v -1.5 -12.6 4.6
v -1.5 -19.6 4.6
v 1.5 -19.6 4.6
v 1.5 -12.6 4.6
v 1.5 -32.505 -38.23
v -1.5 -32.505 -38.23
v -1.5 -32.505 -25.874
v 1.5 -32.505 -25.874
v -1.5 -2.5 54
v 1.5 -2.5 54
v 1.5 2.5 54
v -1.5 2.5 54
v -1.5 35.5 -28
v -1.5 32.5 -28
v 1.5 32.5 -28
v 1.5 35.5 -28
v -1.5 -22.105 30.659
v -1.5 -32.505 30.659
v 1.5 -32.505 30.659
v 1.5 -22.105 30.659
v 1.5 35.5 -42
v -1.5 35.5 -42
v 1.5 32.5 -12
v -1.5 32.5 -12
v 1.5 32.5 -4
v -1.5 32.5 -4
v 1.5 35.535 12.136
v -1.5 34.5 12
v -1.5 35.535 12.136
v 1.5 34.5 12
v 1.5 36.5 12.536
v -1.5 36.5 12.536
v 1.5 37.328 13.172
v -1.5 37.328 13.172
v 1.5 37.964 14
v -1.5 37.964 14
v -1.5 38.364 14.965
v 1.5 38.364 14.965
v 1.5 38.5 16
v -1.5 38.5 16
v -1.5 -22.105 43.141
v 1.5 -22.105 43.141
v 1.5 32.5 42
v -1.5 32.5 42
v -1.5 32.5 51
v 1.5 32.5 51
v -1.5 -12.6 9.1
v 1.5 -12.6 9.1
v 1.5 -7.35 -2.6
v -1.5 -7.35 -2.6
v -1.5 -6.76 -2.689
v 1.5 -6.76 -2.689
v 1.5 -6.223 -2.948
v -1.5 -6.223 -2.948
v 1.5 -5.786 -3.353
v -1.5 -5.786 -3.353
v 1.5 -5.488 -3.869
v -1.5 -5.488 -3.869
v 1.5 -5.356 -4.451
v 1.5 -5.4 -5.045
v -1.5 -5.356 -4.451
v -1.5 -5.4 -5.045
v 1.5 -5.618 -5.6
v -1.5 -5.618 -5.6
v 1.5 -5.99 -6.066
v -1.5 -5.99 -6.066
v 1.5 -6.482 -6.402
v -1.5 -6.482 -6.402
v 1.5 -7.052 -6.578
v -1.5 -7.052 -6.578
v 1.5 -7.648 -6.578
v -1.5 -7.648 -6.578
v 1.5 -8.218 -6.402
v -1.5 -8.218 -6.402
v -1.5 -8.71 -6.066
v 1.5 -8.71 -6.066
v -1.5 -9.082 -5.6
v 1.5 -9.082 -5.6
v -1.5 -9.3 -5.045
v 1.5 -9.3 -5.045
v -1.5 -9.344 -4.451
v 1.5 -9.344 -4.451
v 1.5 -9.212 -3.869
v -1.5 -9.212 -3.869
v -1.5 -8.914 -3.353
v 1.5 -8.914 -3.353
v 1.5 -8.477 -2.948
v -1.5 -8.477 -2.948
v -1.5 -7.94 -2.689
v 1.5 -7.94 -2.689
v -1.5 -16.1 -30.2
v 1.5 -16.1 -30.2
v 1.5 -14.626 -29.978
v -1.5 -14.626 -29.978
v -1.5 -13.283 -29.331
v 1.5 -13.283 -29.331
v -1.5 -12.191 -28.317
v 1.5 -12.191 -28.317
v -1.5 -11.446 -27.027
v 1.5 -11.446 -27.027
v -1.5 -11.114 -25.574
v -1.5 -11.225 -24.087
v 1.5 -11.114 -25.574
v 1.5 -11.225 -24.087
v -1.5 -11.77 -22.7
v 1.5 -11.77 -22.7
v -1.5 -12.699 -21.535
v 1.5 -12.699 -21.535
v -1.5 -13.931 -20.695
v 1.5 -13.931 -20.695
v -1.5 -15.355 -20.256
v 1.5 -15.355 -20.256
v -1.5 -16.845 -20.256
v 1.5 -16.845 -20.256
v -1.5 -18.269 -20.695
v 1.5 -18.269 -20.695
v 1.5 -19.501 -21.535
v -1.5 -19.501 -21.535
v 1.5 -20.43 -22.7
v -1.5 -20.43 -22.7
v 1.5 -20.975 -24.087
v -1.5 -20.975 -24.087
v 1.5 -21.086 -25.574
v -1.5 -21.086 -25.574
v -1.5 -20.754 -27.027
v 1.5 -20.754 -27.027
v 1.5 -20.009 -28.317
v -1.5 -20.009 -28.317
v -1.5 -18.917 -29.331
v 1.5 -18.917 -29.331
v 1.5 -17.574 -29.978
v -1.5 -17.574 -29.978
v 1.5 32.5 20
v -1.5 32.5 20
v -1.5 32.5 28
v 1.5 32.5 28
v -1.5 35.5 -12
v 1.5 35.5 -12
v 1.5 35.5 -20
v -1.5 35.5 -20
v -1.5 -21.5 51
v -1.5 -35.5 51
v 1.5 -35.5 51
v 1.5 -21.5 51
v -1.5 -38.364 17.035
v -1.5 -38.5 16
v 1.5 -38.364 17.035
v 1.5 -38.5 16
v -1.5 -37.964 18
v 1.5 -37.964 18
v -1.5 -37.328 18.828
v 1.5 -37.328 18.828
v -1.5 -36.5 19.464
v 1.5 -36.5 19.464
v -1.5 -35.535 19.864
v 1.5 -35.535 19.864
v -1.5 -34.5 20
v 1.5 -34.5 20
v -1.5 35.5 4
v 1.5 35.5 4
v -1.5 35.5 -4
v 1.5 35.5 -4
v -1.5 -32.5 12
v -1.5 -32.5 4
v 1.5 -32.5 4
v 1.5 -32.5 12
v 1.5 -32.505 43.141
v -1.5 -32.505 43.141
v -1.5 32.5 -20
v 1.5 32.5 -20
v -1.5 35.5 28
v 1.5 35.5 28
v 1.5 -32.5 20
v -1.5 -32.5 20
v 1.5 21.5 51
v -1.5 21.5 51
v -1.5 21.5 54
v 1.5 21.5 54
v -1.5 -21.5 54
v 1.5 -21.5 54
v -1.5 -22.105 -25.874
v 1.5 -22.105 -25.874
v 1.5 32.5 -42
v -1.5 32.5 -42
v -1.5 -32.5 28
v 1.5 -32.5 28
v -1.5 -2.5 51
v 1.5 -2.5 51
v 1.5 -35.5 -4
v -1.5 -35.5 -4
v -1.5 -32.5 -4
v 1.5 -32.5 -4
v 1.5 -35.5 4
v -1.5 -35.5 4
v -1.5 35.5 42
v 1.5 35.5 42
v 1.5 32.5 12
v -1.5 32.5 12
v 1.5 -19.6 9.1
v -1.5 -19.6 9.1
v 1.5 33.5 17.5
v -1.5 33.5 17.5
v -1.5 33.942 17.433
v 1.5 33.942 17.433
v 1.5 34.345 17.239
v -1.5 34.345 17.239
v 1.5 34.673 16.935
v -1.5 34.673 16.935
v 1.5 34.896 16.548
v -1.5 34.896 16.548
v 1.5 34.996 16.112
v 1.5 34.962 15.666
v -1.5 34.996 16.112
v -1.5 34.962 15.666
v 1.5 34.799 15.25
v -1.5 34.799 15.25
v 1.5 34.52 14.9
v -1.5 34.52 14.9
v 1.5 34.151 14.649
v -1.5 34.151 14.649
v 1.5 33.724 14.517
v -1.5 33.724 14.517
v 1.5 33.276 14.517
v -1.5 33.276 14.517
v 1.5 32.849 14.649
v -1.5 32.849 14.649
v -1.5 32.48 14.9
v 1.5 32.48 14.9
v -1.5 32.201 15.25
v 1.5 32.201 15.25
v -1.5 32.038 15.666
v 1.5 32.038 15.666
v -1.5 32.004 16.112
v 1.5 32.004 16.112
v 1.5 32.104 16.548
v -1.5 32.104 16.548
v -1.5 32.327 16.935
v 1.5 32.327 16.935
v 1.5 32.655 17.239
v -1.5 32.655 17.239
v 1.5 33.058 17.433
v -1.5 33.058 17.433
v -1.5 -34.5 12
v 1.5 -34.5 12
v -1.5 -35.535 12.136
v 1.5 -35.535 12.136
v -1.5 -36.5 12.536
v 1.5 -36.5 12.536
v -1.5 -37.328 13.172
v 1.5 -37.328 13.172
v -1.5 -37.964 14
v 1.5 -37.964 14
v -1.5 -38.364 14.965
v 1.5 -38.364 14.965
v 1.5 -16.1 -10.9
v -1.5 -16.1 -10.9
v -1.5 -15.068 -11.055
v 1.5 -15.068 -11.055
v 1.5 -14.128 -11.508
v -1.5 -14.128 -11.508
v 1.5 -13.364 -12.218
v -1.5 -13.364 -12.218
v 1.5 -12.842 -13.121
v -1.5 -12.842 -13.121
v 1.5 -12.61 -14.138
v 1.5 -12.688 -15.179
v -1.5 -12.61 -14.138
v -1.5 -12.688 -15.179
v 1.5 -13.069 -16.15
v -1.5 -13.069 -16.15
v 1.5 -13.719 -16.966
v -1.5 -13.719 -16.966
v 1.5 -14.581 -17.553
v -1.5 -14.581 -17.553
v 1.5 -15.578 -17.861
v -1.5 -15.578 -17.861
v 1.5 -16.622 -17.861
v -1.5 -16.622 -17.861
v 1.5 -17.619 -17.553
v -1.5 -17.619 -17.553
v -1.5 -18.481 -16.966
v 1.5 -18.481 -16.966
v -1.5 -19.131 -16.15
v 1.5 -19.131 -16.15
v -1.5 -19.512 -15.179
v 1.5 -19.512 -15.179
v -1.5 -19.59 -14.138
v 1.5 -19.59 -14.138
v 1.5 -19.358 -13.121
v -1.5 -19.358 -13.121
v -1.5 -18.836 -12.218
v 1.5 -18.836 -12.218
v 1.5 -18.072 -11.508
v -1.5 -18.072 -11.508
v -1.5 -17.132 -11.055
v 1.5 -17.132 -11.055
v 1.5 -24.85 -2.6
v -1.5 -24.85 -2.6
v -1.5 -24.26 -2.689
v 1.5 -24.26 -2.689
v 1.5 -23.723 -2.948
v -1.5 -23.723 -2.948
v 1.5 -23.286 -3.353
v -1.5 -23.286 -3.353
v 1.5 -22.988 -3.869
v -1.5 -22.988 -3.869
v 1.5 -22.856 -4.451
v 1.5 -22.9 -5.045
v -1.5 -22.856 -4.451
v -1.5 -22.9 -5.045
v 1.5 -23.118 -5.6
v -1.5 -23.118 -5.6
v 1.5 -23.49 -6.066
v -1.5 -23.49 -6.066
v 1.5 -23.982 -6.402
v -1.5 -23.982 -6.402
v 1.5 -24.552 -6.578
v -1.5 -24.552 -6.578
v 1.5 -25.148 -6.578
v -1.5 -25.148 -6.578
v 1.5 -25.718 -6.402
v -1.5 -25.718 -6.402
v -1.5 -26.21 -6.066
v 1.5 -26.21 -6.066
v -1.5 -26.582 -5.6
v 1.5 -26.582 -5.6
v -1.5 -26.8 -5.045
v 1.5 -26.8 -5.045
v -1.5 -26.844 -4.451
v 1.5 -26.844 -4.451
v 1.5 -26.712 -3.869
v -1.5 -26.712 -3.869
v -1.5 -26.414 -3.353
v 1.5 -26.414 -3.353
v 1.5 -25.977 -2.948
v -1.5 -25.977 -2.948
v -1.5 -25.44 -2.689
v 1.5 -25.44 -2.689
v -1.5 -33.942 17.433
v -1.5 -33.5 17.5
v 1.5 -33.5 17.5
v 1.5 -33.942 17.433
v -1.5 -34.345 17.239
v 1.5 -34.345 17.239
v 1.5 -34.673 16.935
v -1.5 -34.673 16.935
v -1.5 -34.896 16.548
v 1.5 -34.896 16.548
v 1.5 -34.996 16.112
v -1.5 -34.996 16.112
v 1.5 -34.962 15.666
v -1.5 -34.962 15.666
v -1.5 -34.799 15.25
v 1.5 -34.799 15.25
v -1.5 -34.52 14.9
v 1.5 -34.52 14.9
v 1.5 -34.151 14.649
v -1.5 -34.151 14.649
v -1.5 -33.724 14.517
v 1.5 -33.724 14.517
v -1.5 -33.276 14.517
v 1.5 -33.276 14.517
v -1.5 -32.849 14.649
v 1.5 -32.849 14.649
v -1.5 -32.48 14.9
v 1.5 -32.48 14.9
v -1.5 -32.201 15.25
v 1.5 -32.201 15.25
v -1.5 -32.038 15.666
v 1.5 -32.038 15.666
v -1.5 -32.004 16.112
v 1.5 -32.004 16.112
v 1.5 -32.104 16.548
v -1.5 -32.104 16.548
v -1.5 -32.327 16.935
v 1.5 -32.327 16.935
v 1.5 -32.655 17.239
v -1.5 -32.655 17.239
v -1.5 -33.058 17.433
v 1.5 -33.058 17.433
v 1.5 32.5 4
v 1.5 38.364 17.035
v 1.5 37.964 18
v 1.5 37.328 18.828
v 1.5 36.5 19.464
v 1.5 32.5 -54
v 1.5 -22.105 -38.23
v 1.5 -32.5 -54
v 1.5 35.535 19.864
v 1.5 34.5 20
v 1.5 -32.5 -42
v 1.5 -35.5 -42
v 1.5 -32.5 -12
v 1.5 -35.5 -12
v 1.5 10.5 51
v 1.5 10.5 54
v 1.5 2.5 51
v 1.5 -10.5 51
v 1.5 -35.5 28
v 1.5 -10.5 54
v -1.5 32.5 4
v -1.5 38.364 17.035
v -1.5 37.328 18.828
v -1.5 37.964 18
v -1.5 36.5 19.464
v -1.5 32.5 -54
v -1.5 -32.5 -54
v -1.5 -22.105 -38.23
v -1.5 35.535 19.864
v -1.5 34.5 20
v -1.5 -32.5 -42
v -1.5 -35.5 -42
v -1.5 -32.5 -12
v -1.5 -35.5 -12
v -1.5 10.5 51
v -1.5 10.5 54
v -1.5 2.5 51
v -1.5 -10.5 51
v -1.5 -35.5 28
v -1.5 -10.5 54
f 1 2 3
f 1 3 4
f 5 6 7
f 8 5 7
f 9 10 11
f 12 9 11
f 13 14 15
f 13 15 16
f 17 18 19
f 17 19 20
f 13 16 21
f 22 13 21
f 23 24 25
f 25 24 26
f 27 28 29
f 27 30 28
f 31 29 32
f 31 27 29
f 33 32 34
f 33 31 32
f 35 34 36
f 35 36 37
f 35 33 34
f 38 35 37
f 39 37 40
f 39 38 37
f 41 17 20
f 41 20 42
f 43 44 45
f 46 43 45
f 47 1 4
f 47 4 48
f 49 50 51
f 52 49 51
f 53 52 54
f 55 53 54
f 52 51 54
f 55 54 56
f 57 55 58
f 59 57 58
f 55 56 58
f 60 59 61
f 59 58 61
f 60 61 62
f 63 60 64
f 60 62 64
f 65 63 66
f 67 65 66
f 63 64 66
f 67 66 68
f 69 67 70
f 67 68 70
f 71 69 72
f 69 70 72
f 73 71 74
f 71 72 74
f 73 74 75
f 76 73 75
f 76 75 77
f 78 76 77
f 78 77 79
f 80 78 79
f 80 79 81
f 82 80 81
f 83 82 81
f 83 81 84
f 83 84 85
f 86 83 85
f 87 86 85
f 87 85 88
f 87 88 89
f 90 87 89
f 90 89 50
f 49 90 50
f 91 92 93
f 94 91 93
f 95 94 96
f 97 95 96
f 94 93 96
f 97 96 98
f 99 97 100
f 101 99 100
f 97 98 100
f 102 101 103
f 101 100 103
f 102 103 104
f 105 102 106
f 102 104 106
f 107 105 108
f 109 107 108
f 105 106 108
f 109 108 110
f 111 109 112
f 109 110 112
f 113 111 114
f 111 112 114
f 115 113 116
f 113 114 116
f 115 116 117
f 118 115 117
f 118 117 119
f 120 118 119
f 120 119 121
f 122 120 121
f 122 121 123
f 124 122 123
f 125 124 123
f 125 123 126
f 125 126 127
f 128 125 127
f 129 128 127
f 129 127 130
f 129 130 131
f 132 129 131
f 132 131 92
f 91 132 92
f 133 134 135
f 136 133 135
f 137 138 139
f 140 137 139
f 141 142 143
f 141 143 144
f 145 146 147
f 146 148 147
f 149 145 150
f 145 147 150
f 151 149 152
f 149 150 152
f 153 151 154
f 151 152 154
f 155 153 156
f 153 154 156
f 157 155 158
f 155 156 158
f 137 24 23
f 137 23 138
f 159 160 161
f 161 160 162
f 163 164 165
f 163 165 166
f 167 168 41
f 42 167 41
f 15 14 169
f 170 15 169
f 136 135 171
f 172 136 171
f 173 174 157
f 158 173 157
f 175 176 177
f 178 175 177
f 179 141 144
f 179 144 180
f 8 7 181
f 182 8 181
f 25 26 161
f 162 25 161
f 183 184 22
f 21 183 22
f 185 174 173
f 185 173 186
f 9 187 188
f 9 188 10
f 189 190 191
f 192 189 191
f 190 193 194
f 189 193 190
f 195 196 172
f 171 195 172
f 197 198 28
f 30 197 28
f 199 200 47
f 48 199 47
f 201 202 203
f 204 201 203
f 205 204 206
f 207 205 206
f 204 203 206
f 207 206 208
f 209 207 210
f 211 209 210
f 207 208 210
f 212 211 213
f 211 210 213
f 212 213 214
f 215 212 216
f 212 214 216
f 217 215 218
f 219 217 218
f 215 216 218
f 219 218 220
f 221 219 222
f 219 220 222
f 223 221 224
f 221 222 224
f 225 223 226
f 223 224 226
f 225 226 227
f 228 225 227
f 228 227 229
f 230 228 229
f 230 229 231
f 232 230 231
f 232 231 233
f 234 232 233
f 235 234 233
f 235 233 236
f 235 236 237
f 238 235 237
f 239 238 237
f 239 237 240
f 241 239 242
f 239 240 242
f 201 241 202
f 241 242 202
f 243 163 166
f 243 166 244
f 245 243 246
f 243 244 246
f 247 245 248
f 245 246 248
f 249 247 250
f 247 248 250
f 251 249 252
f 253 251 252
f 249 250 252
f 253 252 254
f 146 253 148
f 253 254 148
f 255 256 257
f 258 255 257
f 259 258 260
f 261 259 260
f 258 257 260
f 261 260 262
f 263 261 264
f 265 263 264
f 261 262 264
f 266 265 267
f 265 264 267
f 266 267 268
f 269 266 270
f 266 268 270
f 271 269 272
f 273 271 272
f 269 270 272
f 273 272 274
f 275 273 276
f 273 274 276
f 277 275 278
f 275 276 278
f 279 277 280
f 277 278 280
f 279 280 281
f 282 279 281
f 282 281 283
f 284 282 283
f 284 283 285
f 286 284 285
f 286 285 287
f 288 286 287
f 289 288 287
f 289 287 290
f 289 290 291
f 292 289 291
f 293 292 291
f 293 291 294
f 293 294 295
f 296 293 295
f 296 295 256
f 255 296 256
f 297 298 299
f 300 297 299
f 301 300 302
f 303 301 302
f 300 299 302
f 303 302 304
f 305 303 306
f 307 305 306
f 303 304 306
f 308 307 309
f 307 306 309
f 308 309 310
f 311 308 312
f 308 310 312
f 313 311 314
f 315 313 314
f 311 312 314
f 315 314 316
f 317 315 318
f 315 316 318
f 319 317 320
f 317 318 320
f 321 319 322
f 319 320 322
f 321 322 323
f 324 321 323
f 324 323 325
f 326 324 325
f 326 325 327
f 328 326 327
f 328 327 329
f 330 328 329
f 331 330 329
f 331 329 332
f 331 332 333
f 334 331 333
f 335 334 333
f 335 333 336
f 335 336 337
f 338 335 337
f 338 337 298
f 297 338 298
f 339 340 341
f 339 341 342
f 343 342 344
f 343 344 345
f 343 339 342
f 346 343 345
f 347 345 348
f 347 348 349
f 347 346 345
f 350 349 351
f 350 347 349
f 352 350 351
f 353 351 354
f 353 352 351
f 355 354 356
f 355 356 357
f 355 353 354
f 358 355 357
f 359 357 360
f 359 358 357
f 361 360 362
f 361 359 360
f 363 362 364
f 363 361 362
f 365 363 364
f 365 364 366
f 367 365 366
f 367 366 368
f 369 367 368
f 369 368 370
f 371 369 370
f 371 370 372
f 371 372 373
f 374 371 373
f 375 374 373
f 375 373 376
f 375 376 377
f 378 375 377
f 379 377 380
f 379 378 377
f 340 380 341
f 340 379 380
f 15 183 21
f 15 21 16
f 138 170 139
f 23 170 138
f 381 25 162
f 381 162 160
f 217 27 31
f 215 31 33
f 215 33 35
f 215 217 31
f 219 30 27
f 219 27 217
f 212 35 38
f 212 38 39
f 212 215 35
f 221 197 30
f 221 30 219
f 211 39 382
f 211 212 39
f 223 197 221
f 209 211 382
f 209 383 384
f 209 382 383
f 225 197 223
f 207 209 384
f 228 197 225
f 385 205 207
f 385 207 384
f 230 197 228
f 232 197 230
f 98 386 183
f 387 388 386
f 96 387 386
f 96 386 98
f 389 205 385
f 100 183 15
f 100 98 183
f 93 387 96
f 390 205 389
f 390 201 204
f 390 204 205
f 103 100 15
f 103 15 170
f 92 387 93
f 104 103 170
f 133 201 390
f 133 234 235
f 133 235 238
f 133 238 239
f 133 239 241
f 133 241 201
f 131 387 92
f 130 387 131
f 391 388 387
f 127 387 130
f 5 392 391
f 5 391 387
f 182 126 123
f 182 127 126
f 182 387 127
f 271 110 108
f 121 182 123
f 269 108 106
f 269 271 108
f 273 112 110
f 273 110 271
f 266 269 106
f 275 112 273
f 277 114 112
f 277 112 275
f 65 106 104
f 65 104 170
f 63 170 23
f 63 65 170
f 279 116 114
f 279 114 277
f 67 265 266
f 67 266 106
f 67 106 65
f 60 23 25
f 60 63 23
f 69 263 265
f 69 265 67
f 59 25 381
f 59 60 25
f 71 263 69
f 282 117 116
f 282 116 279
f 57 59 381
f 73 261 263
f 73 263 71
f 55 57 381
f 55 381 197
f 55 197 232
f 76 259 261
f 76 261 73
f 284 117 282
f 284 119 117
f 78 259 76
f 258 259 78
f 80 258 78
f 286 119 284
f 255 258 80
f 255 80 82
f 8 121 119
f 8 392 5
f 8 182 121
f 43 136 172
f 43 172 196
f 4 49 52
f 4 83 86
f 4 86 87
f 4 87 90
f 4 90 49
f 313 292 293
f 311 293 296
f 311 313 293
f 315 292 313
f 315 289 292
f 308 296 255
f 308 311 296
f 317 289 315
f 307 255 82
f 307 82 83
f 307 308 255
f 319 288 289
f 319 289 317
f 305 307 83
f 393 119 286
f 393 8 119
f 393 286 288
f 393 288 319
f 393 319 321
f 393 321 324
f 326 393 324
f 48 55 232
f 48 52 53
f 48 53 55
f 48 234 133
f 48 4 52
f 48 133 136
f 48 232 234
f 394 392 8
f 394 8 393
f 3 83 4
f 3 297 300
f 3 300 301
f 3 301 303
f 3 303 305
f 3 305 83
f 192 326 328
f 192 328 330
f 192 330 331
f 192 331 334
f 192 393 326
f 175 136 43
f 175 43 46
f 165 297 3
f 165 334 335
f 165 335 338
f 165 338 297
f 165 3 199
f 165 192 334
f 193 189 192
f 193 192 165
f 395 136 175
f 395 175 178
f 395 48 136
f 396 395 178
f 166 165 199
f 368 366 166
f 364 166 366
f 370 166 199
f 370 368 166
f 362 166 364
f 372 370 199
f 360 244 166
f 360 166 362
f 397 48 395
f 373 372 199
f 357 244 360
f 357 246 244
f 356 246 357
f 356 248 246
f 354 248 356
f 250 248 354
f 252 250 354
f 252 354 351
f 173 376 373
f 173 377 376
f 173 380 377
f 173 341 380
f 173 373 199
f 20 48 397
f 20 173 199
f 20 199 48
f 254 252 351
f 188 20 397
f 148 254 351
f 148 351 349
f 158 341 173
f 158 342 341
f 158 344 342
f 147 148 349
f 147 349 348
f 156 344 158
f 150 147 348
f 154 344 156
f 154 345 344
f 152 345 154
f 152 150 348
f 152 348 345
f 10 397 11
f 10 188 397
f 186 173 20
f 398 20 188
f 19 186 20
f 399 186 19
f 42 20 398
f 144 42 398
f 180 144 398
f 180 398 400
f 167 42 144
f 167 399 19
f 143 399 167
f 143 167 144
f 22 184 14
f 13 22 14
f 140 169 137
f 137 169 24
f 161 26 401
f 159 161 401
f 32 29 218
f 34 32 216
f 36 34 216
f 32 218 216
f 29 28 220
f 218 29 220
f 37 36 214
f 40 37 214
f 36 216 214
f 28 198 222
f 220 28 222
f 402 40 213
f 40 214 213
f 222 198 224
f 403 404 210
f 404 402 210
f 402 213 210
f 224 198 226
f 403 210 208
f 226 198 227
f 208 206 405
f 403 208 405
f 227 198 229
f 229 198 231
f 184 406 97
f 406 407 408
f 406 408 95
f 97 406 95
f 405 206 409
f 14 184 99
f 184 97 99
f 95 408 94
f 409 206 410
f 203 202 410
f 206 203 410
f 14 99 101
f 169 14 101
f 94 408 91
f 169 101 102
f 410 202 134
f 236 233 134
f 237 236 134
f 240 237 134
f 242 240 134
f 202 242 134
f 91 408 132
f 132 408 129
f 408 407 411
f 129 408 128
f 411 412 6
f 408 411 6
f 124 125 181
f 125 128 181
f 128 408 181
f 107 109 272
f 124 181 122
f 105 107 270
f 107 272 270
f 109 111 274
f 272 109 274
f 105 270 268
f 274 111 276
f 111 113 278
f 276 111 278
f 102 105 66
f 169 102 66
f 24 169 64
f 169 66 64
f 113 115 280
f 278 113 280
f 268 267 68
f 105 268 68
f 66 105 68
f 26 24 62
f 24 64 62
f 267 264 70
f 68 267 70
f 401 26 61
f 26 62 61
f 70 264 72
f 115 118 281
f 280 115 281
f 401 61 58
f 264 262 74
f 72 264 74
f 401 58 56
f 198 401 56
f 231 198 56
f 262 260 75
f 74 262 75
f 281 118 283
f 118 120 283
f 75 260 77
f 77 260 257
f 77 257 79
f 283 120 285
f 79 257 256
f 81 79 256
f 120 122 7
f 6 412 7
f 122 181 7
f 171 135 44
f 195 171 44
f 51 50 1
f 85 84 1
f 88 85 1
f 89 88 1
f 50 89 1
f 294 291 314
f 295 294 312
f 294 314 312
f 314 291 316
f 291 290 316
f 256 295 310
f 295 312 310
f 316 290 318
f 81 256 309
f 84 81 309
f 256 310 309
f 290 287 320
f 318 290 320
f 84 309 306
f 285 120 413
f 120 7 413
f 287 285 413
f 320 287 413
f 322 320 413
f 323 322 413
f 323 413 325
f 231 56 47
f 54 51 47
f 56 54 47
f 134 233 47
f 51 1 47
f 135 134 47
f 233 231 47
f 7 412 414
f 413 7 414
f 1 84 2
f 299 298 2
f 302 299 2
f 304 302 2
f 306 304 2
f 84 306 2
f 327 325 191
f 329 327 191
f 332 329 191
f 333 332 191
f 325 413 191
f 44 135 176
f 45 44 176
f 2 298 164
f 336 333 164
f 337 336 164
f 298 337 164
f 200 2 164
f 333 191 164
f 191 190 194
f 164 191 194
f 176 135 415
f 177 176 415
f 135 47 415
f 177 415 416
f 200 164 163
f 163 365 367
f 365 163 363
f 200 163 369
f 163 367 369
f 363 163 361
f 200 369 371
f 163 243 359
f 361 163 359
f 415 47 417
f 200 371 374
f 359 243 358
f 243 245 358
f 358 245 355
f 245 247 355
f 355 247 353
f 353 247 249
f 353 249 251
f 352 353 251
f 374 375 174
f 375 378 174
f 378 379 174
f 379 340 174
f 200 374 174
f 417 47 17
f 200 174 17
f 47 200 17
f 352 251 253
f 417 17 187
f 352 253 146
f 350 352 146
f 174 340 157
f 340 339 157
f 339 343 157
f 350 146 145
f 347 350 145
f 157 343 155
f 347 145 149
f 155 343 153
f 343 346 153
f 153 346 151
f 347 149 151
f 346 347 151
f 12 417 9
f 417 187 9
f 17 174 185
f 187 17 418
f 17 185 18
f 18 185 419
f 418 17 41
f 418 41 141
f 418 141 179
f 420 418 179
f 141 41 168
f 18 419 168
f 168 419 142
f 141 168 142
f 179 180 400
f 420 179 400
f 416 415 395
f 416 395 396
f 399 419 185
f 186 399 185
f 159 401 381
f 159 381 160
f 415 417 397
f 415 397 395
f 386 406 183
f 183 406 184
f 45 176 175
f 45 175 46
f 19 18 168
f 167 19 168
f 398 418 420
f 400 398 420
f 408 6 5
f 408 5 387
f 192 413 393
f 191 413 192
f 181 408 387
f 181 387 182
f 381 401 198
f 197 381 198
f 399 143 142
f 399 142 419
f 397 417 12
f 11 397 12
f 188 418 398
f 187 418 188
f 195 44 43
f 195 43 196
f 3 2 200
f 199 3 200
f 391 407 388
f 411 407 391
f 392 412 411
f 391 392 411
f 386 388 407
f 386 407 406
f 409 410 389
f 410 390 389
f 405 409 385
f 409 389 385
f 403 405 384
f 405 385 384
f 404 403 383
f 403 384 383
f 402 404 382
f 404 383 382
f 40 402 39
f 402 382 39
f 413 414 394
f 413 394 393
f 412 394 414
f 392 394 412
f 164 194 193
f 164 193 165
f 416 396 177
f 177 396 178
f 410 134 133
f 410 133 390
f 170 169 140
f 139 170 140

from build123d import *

# Parameters (mm, degrees)
CROQUIS1_W               = 108
CROQUIS1_H               = 71
SALIENTE_EXTRUIR1_DEPTH  = 1.5
CROQUIS2_W               = 12
CROQUIS2_H               = 3
CROQUIS2_W_2             = 8
CORTAR_EXTRUIR1_DEPTH    = 3
CROQUIS6_W               = 3
CROQUIS6_H               = 14
CROQUIS6_H_2             = 8
CORTAR_EXTRUIR3_DEPTH    = 3
CROQUIS8_W               = 8
CROQUIS8_H               = 3
SALIENTE_EXTRUIR2_DEPTH  = 3
REDONDEO2_R              = 4
CROQUIS9_R               = 1.5
CORTAR_EXTRUIR5_DEPTH    = 3
REDONDEO2_OF_SIMETR_A1_R = 4
CROQUIS12_W              = 12.481361742
CROQUIS12_H              = 10.4
CROQUIS12_W_2            = 12.356019523
CORTAR_EXTRUIR7_DEPTH    = 10
CROQUIS10_R              = 4.6
CROQUIS10_R_2            = 3.5
CROQUIS10_R_3            = 2
CROQUIS10_W              = 4.5
CROQUIS10_H              = 7
CORTAR_EXTRUIR6_DEPTH    = 10
CROQUIS14_R              = 5
CROQUIS14_R_2            = 0.007419035
CORTAR_EXTRUIR9_DEPTH    = 10


with BuildPart() as part:
    # Croquis1 → Saliente-Extruir1 (new, symmetric)
    with BuildSketch(Plane(origin=(0, 0, 0), x_dir=(0, 0, -1), z_dir=(1, 0, 0))):
        Rectangle(CROQUIS1_W, CROQUIS1_H)
    extrude(amount=SALIENTE_EXTRUIR1_DEPTH, both=True)

    # Croquis2 → Cortar-Extruir1 (cut)
    with BuildSketch(Plane.ZY.offset(1.5)):
        with Locations((-48, -34)):
            Rectangle(CROQUIS2_W, CROQUIS2_H)
        with Locations((-8, -34)):
            Rectangle(CROQUIS2_W_2, CROQUIS2_H)
        with Locations((48, 34)):
            Rectangle(CROQUIS2_W, CROQUIS2_H)
        with Locations((24, 34)):
            Rectangle(CROQUIS2_W_2, CROQUIS2_H)
        with Locations((8, 34)):
            Rectangle(CROQUIS2_W_2, CROQUIS2_H)
        with Locations((-8, 34)):
            Rectangle(CROQUIS2_W_2, CROQUIS2_H)
        with Locations((-24, 34)):
            Rectangle(CROQUIS2_W_2, CROQUIS2_H)
        with Locations((-48, 34)):
            Rectangle(CROQUIS2_W, CROQUIS2_H)
        with Locations((8, -34)):
            Rectangle(CROQUIS2_W_2, CROQUIS2_H)
        with Locations((24, -34)):
            Rectangle(CROQUIS2_W_2, CROQUIS2_H)
    extrude(amount=-CORTAR_EXTRUIR1_DEPTH, mode=Mode.SUBTRACT)

    # Croquis6 → Cortar-Extruir3 (cut)
    with BuildSketch(Plane.ZY.offset(1.5)):
        with Locations((52.5, -28.5)):
            Rectangle(CROQUIS6_W, CROQUIS6_H)
        with Locations((52.5, -6.5)):
            Rectangle(CROQUIS6_W, CROQUIS6_H_2)
        with Locations((52.5, 6.5)):
            Rectangle(CROQUIS6_W, CROQUIS6_H_2)
        with Locations((52.5, 28.5)):
            Rectangle(CROQUIS6_W, CROQUIS6_H)
    extrude(amount=-CORTAR_EXTRUIR3_DEPTH, mode=Mode.SUBTRACT)

    # Croquis8 → Saliente-Extruir2 (add)
    with BuildSketch(Plane.ZY.offset(1.5)):
        with Locations((16, 37)):
            Rectangle(CROQUIS8_W, CROQUIS8_H)
    saliente_extruir2 = extrude(amount=-SALIENTE_EXTRUIR2_DEPTH)

    # Redondeo2
    redondeo2_edges = [part.edges().sort_by_distance(p)[0] for p in [
        (0, 38.5, 20),
        (0, 38.5, 12),
    ]]
    fillet(redondeo2_edges, radius=REDONDEO2_R - 0.0001)  # a hair under: the kernel refuses the full size

    # Croquis9 → Cortar-Extruir5 (cut)
    with BuildSketch(Plane.ZY.offset(1.5)):
        with Locations((16, 33.5)):
            Circle(CROQUIS9_R)
    cortar_extruir5 = extrude(amount=-CORTAR_EXTRUIR5_DEPTH, mode=Mode.SUBTRACT)

    # Simetría1: Saliente-Extruir2, Cortar-Extruir5 across plane
    add(saliente_extruir2.mirror(Plane.ZX))
    add(cortar_extruir5.mirror(Plane.ZX), mode=Mode.SUBTRACT)

    # Redondeo2 of Simetría1
    redondeo2_of_simetr_a1_edges = [part.edges().sort_by_distance(p)[0] for p in [
        (0, -38.5, 20),
        (0, -38.5, 12),
    ]]
    fillet(redondeo2_of_simetr_a1_edges, radius=REDONDEO2_OF_SIMETR_A1_R - 0.0001)  # a hair under: the kernel refuses the full size

    # Croquis12 → Cortar-Extruir7 (cut)
    with BuildSketch(Plane.ZY.offset(1.5)):
        with Locations((36.9, -27.305454422)):
            Rectangle(CROQUIS12_W, CROQUIS12_H)
        with Locations((-32.051890368, -27.305454422)):
            Rectangle(CROQUIS12_W_2, CROQUIS12_H)
    extrude(amount=-CORTAR_EXTRUIR7_DEPTH, mode=Mode.SUBTRACT)

    # Croquis10 → Cortar-Extruir6 (cut)
    with BuildSketch(Plane.ZY.offset(1.5)):
        with Locations((-25.2, -16.1)):
            Circle(CROQUIS10_R)
        with Locations((-14.4, -16.1)):
            Circle(CROQUIS10_R_2)
        with Locations((-4.6, -24.85)):
            Circle(CROQUIS10_R_3)
        with Locations((6.85, -16.1)):
            Rectangle(CROQUIS10_W, CROQUIS10_H)
        with Locations((-4.6, -7.35)):
            Circle(CROQUIS10_R_3)
    extrude(amount=-CORTAR_EXTRUIR6_DEPTH, mode=Mode.SUBTRACT)

    # Croquis14 → Cortar-Extruir9 (cut)
    with BuildSketch(Plane(origin=(1.5, 0, 0), x_dir=(0, 0, -1), z_dir=(1, 0, 0))):
        with Locations((25.2, -16.1)):
            Circle(CROQUIS14_R)
        with Locations((21.161787618, -13.912617849)):
            Circle(CROQUIS14_R_2, mode=Mode.SUBTRACT)
    extrude(amount=-CORTAR_EXTRUIR9_DEPTH, mode=Mode.SUBTRACT)


solid = part.part
